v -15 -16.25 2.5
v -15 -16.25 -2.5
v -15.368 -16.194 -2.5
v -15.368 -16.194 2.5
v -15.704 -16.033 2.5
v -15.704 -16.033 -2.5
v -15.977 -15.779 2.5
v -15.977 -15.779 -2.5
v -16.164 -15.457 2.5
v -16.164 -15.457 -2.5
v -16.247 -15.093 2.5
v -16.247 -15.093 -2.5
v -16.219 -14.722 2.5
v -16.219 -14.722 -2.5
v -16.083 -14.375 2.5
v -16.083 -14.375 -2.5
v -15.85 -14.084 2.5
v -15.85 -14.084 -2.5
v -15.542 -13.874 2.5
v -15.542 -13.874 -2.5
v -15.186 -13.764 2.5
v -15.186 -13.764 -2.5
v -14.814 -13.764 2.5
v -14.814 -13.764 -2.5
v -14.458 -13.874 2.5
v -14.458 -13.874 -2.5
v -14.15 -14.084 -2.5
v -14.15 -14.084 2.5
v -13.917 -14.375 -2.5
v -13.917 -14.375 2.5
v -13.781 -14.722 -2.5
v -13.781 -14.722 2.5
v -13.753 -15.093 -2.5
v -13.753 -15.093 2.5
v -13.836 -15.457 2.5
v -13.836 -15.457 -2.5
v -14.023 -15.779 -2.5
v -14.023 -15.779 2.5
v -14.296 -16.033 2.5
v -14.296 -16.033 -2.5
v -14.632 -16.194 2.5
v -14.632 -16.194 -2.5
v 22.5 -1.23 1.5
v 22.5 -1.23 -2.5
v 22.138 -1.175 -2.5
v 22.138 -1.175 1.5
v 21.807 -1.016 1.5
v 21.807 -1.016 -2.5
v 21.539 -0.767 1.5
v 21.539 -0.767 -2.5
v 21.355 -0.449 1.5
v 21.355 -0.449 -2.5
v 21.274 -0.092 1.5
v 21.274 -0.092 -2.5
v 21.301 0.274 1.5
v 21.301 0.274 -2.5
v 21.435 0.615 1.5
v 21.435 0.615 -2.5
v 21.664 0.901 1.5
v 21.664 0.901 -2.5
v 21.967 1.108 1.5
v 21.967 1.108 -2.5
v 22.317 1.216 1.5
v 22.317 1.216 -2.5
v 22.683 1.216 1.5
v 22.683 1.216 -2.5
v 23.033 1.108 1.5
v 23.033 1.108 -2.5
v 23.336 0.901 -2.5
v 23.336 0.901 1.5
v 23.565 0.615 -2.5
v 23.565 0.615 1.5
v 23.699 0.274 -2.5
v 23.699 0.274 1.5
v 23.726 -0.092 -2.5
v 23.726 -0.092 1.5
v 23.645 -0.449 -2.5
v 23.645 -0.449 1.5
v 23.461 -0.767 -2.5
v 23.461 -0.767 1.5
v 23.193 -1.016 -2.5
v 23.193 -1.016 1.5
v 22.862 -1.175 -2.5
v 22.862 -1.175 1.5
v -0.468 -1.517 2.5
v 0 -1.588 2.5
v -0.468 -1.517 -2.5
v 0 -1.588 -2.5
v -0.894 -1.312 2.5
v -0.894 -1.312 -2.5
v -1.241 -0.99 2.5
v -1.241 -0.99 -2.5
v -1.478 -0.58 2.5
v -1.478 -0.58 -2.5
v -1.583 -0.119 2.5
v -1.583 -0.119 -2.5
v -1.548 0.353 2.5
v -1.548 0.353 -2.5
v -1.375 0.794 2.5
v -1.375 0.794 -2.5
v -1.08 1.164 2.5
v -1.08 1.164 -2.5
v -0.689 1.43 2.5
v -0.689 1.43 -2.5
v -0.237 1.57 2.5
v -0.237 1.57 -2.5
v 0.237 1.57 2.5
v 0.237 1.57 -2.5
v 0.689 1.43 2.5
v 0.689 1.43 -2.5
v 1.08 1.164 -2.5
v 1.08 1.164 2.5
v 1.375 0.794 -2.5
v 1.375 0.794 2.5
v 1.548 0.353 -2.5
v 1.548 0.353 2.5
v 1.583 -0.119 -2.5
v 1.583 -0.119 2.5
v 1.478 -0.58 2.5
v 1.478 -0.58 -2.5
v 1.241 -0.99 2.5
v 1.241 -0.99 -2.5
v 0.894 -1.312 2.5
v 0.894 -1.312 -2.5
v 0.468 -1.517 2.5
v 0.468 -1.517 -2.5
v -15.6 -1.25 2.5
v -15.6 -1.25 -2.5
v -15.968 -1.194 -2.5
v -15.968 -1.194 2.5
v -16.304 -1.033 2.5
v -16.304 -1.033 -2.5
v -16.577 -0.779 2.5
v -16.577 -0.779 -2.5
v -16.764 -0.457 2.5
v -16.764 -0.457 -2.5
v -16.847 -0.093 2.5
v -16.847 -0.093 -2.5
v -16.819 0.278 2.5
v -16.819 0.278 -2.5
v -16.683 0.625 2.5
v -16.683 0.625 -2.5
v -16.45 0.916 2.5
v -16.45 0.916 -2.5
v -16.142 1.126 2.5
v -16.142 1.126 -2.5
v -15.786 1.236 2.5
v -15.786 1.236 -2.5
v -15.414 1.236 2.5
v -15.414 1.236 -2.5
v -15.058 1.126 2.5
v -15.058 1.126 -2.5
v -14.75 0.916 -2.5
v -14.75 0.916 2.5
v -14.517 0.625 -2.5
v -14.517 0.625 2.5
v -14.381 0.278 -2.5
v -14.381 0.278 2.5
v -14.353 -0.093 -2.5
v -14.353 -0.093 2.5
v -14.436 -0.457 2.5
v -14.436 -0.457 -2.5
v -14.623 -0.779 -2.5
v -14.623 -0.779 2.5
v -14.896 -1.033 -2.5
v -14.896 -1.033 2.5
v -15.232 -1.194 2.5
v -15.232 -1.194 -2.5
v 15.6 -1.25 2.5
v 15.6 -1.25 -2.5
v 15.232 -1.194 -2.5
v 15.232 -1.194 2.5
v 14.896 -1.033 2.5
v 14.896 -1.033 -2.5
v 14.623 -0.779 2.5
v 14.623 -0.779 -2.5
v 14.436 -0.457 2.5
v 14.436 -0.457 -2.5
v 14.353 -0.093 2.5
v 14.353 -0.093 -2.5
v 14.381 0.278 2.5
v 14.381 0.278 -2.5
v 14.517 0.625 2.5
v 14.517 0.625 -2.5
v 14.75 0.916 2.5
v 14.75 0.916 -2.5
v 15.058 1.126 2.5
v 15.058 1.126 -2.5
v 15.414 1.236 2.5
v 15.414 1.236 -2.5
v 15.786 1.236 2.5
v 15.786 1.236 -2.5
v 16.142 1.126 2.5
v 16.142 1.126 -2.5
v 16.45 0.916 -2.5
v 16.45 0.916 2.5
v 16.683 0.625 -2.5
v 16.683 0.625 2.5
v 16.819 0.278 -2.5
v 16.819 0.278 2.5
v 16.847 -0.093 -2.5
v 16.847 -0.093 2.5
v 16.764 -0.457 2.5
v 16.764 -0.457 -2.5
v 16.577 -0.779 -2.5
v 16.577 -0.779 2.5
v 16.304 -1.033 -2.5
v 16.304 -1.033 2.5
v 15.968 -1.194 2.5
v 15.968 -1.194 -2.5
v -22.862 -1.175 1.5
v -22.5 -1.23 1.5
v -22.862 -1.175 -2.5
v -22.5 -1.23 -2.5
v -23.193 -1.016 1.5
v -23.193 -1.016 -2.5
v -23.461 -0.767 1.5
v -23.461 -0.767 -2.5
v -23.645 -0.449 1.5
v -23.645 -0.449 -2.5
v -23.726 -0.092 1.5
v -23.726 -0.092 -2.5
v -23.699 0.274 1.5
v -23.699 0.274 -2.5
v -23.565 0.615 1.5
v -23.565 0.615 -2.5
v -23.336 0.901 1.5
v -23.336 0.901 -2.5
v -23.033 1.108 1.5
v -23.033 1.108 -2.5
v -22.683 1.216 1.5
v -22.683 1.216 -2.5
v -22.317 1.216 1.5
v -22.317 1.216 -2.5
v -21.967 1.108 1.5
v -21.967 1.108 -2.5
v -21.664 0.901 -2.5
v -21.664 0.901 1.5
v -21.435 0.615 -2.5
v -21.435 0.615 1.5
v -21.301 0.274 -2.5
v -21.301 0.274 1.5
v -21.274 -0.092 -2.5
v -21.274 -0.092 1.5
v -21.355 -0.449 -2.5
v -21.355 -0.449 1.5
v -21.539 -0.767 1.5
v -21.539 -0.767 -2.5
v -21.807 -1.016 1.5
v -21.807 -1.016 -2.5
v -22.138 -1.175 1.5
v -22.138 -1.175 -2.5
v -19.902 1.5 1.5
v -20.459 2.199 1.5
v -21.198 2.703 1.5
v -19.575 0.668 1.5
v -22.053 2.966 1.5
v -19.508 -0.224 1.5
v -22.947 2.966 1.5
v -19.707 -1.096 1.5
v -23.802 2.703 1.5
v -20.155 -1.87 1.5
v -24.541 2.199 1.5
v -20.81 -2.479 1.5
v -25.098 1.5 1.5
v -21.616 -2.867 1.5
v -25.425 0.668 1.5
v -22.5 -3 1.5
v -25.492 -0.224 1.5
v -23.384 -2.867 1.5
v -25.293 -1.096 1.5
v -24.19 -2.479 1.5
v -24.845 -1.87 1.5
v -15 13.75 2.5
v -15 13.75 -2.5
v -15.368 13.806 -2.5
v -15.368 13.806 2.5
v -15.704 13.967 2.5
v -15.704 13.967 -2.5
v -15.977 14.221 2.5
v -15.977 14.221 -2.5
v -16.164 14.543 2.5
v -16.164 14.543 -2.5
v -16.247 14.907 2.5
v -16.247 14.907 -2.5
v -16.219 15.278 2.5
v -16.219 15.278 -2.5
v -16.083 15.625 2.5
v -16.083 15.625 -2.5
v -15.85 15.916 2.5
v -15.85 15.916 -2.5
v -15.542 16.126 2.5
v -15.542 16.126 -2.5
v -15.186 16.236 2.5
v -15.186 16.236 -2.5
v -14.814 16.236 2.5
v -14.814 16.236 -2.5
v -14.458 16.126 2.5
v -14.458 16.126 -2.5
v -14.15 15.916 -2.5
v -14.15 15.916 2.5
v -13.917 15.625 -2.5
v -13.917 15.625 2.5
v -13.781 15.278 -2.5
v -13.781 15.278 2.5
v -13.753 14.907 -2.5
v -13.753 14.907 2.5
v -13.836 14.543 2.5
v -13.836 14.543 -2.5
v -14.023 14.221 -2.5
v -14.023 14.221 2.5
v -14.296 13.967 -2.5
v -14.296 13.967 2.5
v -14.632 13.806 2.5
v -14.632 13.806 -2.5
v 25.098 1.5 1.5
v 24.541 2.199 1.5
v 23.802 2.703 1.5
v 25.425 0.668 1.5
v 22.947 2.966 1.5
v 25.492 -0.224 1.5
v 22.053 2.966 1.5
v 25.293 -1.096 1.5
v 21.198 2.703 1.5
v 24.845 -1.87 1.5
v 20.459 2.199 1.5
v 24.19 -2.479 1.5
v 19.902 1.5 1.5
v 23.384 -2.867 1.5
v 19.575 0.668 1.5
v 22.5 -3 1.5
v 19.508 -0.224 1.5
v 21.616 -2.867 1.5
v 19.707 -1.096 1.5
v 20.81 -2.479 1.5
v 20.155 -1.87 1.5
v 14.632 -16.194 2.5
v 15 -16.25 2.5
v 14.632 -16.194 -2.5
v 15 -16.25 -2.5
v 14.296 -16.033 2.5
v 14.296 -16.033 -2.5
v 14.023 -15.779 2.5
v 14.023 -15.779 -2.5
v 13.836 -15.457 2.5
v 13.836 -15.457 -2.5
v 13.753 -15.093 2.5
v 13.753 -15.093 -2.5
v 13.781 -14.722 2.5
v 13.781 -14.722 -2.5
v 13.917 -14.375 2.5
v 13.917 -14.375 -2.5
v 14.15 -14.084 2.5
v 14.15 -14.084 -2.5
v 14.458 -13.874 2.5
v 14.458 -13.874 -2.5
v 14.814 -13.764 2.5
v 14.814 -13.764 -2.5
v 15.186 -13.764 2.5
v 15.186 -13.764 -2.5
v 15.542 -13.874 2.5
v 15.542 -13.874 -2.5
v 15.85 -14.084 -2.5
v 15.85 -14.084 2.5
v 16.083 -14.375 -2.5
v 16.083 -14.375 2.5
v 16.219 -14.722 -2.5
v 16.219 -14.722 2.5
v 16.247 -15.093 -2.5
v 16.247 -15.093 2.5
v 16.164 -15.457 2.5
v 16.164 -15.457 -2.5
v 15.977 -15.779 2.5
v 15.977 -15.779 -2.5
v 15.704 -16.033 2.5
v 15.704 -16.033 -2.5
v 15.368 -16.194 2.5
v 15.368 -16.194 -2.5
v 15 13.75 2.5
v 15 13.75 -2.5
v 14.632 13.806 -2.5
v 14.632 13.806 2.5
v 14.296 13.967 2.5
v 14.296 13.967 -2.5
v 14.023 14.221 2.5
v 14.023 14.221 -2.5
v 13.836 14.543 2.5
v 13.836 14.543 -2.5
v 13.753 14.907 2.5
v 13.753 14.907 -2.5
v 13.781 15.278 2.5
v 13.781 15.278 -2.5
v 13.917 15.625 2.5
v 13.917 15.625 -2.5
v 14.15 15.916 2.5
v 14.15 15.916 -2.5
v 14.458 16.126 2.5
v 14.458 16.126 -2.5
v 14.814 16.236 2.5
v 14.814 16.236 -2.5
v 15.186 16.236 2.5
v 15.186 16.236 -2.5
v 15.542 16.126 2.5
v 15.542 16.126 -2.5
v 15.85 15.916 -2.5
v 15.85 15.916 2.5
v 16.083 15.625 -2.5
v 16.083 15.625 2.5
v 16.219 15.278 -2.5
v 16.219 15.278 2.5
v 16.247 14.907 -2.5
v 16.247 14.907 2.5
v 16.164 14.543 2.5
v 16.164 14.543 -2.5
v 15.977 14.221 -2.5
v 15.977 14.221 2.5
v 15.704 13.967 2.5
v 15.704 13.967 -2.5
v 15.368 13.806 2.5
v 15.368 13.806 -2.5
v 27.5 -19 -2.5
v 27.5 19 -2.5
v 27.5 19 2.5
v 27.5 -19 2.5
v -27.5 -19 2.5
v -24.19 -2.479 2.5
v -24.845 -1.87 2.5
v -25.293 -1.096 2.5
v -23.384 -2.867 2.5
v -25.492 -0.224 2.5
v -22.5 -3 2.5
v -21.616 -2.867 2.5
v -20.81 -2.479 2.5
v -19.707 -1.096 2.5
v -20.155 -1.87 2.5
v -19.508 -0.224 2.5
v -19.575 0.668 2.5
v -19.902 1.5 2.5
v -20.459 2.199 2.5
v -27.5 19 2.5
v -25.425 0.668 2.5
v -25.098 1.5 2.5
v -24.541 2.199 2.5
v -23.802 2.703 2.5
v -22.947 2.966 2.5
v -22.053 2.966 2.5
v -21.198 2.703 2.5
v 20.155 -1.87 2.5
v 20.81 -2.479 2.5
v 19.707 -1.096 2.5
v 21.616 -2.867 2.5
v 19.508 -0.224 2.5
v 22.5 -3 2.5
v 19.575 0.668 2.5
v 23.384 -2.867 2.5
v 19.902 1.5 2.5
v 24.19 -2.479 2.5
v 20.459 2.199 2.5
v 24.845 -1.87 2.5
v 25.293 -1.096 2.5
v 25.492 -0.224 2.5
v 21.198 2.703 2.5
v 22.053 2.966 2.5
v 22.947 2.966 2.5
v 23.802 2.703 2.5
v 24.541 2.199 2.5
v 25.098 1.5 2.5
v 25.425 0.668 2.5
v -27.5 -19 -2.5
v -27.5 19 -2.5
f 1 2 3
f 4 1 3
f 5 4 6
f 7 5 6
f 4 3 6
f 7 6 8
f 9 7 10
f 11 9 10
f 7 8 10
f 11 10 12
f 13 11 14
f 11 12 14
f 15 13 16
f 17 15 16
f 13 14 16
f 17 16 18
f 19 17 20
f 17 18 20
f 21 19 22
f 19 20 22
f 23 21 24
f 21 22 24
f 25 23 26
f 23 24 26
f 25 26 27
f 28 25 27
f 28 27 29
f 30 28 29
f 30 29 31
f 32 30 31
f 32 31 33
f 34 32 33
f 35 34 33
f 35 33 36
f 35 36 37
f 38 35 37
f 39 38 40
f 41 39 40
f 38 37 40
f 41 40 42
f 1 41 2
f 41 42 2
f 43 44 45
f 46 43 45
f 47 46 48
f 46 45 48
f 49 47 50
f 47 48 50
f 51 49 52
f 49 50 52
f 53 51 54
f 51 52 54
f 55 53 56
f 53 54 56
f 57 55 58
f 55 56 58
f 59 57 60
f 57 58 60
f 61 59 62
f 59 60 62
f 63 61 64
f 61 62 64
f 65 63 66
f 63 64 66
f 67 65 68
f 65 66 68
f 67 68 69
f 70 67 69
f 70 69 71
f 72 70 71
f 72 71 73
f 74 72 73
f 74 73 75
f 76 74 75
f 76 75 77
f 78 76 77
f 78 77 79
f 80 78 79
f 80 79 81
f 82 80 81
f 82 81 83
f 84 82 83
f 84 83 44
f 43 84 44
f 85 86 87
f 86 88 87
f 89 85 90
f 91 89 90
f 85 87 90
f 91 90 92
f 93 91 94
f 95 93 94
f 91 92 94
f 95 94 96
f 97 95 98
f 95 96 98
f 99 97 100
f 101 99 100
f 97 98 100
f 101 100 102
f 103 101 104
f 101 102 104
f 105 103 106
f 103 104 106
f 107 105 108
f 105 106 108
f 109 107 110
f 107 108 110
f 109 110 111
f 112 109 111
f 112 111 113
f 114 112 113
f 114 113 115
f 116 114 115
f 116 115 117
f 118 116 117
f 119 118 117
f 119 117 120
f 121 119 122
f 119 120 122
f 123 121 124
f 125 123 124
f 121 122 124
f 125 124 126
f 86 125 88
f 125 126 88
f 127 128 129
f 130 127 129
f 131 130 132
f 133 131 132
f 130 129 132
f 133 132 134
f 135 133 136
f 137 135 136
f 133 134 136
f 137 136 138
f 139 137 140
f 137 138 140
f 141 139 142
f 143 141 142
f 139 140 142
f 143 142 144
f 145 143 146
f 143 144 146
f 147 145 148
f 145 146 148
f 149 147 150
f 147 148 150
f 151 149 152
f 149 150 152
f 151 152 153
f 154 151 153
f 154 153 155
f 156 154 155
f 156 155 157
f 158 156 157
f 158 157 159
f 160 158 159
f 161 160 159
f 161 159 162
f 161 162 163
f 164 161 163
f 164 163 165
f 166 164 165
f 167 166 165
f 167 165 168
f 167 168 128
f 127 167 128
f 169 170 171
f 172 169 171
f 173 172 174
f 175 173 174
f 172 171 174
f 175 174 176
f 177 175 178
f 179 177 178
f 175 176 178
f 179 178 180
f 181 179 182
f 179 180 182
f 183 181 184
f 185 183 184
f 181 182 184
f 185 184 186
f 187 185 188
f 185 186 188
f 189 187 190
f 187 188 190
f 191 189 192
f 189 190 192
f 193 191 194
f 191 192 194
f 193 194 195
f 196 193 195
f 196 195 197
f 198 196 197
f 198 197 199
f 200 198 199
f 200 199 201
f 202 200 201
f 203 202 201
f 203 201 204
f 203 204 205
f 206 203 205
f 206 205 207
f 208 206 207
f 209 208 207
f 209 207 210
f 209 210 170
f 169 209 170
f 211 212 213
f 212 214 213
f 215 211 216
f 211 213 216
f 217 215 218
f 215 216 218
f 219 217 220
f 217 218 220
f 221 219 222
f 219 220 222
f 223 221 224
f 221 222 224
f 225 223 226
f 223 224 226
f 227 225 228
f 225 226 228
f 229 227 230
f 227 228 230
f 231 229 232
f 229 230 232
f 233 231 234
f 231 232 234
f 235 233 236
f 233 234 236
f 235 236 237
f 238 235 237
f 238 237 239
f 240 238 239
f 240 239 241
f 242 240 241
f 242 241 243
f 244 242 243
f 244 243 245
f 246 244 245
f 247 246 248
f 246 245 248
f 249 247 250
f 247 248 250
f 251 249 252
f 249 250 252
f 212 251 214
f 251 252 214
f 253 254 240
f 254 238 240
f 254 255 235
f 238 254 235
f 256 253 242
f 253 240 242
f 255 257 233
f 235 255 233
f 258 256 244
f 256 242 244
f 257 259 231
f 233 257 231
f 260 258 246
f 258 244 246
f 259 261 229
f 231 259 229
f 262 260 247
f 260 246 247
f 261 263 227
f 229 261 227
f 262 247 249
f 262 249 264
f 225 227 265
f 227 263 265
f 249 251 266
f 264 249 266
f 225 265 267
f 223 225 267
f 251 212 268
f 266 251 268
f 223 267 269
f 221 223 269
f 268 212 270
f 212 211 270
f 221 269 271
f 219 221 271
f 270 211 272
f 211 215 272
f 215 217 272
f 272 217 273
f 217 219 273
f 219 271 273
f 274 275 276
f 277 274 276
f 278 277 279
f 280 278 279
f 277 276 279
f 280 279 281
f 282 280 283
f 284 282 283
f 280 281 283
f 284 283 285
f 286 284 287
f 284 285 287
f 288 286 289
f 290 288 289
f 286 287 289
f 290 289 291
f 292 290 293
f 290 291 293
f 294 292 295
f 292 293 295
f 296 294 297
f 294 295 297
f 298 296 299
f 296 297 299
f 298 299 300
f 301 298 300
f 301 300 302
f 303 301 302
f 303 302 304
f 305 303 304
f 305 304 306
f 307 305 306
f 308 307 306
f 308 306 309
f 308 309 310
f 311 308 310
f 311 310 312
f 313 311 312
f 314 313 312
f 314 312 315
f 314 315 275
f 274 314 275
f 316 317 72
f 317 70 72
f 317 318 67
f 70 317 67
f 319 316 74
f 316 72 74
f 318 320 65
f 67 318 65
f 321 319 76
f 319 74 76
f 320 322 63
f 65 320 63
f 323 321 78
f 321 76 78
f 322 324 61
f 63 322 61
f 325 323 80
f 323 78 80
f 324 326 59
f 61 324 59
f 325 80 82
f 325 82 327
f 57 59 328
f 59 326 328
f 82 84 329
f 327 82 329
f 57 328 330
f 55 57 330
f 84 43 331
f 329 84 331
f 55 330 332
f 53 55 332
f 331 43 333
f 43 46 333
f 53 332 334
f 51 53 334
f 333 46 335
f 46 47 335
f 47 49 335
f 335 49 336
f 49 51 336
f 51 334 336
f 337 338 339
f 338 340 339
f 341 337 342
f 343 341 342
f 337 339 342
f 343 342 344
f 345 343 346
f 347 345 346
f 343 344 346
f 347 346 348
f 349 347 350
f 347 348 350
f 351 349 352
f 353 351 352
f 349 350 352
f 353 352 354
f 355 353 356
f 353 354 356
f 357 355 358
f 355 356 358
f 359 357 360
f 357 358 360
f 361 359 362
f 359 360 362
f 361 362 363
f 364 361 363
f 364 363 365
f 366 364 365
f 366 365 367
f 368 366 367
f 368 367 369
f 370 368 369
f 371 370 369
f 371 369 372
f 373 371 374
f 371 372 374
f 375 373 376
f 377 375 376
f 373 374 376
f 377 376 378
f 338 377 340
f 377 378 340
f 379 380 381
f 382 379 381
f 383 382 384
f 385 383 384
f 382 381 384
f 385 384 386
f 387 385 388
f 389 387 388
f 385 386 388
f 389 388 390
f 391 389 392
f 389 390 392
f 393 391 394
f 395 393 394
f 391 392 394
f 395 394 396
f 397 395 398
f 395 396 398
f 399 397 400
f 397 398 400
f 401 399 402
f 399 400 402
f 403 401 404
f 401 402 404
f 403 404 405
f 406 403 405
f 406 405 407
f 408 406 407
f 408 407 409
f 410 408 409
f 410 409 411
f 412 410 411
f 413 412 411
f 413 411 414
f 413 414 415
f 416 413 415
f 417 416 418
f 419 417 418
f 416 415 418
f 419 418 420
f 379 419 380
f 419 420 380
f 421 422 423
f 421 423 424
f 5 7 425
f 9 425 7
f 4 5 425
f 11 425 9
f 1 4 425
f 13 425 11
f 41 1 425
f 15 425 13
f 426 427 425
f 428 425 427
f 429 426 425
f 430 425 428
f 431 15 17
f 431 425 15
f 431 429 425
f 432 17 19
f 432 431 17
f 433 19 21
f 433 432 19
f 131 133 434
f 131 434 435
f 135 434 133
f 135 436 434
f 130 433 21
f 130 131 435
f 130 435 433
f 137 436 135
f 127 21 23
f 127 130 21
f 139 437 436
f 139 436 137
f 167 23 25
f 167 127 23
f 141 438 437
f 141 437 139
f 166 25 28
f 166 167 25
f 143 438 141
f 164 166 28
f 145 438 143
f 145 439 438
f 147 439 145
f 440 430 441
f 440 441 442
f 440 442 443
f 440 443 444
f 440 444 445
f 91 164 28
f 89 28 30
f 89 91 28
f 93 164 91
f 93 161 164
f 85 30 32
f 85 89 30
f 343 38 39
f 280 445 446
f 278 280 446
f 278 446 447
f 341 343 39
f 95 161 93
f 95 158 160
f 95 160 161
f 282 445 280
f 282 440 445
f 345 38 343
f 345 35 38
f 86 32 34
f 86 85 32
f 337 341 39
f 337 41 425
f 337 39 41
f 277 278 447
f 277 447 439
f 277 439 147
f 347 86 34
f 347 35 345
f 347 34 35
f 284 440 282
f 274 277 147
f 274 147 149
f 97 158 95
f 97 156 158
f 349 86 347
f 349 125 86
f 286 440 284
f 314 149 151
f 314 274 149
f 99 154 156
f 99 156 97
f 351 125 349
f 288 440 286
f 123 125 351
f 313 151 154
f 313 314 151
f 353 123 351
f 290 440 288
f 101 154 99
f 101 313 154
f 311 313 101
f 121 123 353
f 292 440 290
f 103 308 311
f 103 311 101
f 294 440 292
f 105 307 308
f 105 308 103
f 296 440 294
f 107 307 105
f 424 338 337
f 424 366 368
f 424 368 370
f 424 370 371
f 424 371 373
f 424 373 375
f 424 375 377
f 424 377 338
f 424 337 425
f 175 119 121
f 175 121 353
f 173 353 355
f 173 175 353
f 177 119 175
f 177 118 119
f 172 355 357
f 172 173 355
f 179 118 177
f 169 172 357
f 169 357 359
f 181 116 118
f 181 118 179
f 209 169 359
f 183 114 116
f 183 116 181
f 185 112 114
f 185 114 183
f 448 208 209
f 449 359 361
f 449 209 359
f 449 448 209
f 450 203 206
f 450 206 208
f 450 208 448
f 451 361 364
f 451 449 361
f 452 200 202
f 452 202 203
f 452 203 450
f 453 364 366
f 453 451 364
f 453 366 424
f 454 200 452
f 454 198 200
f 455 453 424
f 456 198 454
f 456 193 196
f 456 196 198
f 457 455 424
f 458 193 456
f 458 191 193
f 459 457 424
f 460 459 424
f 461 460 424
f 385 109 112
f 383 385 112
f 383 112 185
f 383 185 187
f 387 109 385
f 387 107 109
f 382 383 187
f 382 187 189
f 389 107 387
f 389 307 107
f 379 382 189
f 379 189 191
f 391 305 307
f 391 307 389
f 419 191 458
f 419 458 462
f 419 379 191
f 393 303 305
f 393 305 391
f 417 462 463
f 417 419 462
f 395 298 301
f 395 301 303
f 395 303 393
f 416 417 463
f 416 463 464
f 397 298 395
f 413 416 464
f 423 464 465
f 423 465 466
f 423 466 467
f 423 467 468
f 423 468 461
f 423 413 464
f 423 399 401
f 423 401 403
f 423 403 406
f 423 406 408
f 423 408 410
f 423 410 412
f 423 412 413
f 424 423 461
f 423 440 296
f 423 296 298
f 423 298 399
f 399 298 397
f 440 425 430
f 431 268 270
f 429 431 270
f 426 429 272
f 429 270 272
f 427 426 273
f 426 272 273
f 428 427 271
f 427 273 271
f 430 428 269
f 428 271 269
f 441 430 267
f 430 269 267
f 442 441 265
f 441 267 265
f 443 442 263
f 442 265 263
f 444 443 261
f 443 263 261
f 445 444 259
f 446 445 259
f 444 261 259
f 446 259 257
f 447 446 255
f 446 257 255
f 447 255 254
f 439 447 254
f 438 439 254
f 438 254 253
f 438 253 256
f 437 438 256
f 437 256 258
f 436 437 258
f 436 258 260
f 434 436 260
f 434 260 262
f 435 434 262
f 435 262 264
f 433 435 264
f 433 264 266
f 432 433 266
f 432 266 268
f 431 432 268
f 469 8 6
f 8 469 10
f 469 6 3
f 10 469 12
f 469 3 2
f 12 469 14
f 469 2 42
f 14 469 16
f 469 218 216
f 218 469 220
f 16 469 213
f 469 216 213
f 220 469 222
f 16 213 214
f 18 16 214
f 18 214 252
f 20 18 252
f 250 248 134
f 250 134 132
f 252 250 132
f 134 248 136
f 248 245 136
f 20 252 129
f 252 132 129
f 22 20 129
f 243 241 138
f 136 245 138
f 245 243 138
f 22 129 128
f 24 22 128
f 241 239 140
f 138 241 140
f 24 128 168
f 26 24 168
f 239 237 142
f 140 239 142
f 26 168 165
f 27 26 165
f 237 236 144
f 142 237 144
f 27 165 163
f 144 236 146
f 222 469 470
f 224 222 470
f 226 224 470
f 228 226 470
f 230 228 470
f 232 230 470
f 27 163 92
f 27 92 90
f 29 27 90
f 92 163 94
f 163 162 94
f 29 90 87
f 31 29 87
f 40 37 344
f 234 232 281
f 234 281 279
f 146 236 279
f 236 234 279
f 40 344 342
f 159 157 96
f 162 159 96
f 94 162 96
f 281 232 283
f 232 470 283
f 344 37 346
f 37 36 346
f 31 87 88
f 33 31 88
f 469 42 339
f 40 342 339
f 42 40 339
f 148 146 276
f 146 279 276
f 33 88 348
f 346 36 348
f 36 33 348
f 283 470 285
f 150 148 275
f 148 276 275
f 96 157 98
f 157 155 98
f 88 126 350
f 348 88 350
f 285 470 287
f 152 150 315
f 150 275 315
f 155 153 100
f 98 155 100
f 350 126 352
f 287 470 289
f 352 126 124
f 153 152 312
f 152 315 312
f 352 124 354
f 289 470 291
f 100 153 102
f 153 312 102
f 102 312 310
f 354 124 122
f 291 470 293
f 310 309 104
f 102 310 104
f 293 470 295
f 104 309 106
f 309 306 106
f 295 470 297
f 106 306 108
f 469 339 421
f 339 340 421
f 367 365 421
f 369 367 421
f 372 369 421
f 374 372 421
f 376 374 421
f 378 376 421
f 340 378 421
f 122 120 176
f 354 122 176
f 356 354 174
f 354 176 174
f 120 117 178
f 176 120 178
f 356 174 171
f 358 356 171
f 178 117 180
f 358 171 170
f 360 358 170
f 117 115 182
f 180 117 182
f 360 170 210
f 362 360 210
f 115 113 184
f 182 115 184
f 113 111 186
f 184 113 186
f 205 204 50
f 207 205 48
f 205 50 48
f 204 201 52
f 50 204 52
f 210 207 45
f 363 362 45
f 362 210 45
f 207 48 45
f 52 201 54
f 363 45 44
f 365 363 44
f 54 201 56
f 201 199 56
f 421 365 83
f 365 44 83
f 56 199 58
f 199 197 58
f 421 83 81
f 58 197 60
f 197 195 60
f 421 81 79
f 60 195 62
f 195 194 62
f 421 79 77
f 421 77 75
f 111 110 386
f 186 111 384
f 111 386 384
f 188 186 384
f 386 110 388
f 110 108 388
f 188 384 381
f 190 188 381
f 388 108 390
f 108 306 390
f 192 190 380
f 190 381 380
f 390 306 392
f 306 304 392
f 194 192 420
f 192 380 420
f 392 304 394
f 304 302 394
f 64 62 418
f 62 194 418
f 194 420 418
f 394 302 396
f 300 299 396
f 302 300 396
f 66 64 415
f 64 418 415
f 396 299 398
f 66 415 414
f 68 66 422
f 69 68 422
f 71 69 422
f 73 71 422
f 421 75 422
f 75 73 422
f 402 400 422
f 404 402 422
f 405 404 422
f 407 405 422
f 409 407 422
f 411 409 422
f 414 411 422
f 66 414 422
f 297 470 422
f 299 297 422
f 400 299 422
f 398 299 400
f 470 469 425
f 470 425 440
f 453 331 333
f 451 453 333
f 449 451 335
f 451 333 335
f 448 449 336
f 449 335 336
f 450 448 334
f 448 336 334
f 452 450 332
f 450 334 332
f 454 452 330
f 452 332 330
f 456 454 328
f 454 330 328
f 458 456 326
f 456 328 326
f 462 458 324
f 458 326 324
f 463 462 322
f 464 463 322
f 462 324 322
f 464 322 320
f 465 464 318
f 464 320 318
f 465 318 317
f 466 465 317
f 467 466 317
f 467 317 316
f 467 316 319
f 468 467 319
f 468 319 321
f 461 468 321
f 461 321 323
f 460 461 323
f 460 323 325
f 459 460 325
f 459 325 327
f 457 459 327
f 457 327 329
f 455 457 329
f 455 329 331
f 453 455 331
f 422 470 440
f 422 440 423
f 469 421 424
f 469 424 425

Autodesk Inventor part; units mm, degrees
ref_plane "YZ Plane" through (0, 0, 0) normal (1, 0, 0) x (0, 1, 0)
ref_plane "XZ Plane" through (0, 0, 0) normal (0, 1, 0) x (-1, 0, 0)
ref_plane "XY Plane" through (0, 0, 0) normal (0, 0, 1) x (1, 0, 0)
sketch "Sketch1" plane through (0, 0, 0) normal (0, 0, 1) x (1, 0, 0)
  line L0 (-27.5, 19) -> (27.5, 19)
  line L1 (27.5, 19) -> (27.5, -19)
  line L2 (27.5, -19) -> (-27.5, -19)
  line L3 (-27.5, -19) -> (-27.5, 19)
  line L4 (-27.5, 19) -> (27.5, -19) construction
  line L5 (27.5, 19) -> (-27.5, -19) construction
  point P0 (0, 0)
  dimension "d2" = 38
  dimension "d3" = 55
extrude "Extrusion1" add sketch "Sketch1" along normal mid plane 5
sketch "Sketch2" plane through (0, 0, 2.5) normal (0, 0, 1) x (1, 0, 0)
  line L0 (-27.5, -19) -> (27.5, -19) projected
  line L1 (27.5, -19) -> (27.5, 19) projected
  line L2 (27.5, 19) -> (-27.5, 19) projected
  line L3 (-27.5, 19) -> (-27.5, -19) projected
  point P0 (0, 0)
  point P1 (-15, 15)
  point P2 (15, 15)
  point P3 (-15, -15)
  point P4 (15, -15)
  point P5 (0, 0)
  point P6 (15.6, 0)
  point P7 (-15.6, 0)
  dimension "d4" = 15
  dimension "d5" = 15
  dimension "d36" = 30
  dimension "d43" = 30
  dimension "d50" = 15.6
  dimension "d57" = 15.6
hole "Hole1" at (-15.6, 0, 2.5) at (-15, 15, 2.5) at (15, 15, 2.5) at (15.6, 0, 2.5) at (15, -15, 2.5) at (-15, -15, 2.5) direction (0, 0, -1) diameter 2.5 end through all
sketch "Sketch3" plane through (0, 0, 2.5) normal (0, 0, 1) x (1, 0, 0)
  point P0 (0, 0)
  point P1 (0, 0)
hole "Hole2" at (0, 0, 2.5) direction (0, 0, -1) diameter 3.175 end through all
sketch "Sketch4" plane through (0, 0, 2.5) normal (0, 0, 1) x (1, 0, 0)
  line L0 (-27.5, 19) -> (-27.5, -19) projected
  line L1 (27.5, -19) -> (27.5, 19) projected
  point P0 (0, 0)
  point P1 (-22.5, 0)
  point P2 (22.5, 0)
  dimension "d76" = 5
  dimension "d77" = 5
  dimension "d89" = 22.5
hole "Hole3" at (-22.5, 0, 2.5) at (22.5, 0, 2.5) direction (0, 0, -1) diameter 2.459 end through all counterbore diameter 6 counterbore depth 1 thread size "M3x0.5" class "6H" standard "ANSI Metric M Profile"
properties part number "baseplate"
